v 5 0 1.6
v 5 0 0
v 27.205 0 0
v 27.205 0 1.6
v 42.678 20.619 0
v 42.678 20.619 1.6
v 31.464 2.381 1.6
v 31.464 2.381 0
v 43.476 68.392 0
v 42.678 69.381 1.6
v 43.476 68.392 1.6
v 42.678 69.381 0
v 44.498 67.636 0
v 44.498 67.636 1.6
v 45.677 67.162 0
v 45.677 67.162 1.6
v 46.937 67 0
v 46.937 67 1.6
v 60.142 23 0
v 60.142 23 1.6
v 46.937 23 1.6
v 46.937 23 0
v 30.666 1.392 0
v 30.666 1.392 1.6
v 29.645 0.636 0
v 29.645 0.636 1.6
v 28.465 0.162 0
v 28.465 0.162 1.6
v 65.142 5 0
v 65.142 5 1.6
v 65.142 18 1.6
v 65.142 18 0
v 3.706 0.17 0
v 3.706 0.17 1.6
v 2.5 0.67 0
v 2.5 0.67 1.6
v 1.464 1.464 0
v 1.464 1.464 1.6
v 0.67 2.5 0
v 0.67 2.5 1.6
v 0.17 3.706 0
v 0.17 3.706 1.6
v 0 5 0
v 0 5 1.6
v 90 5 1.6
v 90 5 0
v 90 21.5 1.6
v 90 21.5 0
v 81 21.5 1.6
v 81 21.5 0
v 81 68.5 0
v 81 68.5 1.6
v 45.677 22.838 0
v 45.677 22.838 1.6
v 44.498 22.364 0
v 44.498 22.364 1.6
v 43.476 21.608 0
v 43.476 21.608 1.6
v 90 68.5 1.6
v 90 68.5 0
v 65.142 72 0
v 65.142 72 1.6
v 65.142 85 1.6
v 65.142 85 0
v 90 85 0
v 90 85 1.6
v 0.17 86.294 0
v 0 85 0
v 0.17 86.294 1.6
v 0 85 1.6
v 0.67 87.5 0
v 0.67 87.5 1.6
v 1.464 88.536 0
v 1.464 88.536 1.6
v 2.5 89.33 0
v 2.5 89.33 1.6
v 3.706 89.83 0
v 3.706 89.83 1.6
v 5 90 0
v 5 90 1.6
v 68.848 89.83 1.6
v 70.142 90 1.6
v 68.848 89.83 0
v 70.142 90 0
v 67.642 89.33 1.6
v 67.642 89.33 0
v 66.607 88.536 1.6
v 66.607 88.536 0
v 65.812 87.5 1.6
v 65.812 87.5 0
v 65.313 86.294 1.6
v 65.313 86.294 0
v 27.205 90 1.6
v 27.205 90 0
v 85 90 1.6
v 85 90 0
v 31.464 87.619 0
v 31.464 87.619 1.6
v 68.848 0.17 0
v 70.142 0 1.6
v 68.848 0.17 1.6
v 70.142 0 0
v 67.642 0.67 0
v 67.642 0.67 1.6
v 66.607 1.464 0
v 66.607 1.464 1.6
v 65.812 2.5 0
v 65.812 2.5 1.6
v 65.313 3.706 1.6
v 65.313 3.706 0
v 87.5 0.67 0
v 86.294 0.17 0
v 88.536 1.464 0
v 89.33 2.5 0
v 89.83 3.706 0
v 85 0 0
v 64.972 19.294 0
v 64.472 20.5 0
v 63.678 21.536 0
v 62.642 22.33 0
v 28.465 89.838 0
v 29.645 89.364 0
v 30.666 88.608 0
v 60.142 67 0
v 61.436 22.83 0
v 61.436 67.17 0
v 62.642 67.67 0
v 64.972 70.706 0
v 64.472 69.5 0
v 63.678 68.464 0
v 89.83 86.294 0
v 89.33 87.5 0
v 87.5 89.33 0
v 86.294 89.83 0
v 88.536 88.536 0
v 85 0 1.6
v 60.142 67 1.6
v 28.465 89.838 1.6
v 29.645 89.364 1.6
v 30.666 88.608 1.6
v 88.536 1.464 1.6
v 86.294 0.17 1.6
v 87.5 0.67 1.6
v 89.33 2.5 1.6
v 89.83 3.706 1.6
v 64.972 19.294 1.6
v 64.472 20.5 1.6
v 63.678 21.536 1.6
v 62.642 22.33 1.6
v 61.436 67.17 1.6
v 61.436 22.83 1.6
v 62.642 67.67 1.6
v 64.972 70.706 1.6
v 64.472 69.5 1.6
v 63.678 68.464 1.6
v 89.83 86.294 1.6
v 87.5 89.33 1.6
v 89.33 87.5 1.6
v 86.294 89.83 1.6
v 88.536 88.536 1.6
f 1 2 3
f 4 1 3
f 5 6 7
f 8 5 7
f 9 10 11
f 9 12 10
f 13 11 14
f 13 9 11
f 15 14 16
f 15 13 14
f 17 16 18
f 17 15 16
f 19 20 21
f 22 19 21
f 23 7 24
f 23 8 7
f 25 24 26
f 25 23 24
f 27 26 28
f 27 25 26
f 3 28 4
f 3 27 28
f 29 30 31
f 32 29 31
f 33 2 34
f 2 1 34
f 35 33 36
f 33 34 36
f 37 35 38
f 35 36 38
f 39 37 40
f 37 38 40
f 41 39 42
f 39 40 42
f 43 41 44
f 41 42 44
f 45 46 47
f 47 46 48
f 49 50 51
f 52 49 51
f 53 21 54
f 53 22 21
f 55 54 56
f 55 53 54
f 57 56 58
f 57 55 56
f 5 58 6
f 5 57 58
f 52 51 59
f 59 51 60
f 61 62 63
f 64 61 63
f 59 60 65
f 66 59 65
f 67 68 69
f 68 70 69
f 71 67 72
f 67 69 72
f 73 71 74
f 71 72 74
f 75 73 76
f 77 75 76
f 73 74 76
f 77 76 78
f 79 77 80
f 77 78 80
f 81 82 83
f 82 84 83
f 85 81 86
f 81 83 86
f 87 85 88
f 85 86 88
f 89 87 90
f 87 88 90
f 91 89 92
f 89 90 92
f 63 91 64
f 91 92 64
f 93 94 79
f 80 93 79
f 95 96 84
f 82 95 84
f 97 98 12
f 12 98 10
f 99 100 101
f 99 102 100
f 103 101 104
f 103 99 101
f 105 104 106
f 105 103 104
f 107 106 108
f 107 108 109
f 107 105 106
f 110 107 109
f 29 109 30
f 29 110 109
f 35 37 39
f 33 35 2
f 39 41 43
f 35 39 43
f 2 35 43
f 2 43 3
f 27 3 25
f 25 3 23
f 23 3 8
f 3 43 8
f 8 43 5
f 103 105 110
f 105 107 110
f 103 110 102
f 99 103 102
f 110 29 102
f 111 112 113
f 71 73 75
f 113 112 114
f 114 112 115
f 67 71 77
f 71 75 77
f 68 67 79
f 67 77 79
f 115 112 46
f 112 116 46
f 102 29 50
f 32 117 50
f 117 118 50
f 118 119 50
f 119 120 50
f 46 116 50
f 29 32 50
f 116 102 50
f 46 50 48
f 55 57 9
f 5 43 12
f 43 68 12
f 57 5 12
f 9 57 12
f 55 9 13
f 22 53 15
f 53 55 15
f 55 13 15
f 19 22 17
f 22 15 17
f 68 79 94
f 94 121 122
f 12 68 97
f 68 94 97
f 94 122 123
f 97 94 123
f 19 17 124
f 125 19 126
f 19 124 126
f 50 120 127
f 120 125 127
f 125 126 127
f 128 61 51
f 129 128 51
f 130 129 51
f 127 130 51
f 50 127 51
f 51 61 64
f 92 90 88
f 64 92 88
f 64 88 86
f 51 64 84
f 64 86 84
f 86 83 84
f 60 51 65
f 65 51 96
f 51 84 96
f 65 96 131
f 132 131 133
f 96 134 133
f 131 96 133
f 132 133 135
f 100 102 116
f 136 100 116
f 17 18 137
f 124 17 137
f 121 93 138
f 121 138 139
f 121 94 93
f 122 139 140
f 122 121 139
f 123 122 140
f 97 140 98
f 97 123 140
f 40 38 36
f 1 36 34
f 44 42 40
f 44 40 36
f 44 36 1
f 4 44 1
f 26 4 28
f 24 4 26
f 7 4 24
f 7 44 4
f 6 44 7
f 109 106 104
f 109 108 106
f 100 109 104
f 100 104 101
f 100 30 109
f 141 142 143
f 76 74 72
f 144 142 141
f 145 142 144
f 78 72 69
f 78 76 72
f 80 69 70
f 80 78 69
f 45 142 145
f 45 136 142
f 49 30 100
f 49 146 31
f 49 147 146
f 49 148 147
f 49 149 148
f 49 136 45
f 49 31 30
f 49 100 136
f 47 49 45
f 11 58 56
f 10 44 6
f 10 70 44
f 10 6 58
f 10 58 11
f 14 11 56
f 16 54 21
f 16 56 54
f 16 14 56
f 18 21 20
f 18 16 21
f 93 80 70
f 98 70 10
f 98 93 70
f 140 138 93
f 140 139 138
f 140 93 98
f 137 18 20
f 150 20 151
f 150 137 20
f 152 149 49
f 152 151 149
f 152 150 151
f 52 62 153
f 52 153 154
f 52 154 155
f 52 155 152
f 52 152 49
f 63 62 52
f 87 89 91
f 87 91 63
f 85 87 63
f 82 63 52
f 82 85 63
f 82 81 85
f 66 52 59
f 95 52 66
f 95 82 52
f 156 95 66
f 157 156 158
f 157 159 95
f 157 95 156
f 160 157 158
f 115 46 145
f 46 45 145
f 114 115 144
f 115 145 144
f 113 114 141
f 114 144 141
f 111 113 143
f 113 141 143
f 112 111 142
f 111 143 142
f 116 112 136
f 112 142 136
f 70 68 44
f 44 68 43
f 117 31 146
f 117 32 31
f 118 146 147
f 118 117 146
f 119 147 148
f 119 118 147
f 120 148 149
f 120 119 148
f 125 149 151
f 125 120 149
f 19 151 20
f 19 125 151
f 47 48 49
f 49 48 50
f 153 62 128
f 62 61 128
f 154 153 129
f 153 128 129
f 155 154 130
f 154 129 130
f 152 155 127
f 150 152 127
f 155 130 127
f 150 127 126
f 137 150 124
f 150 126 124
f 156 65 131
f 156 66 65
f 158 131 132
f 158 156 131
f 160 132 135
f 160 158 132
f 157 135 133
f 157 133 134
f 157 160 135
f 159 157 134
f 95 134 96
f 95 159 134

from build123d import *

# Parameters (mm, degrees)
BOSS_EXTRUDE1_DEPTH = 1.6
SKETCH2_OUTSIDE_W   = 117.458
SKETCH2_OUTSIDE_H   = 117.458
CUT_EXTRUDE1_DEPTH  = 128.289276846
FILLET2_R           = 5


with BuildPart() as part:
    # Sketch1 → Boss-Extrude1 (new body)
    with BuildSketch(Plane.XY):
        Polygon((90, 68.5), (90, 90), (0, 90), (0, 0), (90, 0), (90, 21.5), (81, 21.5), (81, 68.5), align=None)
    extrude(amount=BOSS_EXTRUDE1_DEPTH)

    # Sketch2 outside → Cut-Extrude1 (cut, through all)
    with BuildSketch(Plane.XY.offset(1.6)):
        with Locations((45, 45)):
            Rectangle(SKETCH2_OUTSIDE_W, SKETCH2_OUTSIDE_H)
        Polygon((0, 90), (30, 90), (44.142135624, 67), (65.142135624, 67), (65.142135624, 90), (90, 90), (90, 68.5), (81, 68.5), (81, 21.5), (90, 21.5), (90, 0), (65.142135624, 0), (65.142135624, 23), (44.142135624, 23), (30, 0), (0, 0), align=None, mode=Mode.SUBTRACT)
    extrude(amount=-CUT_EXTRUDE1_DEPTH, mode=Mode.SUBTRACT)

    # Fillet2
    fillet2_edges = [part.edges().sort_by_distance(p)[0] for p in [
        (0, 90, 0.8),
        (90, 90, 0.8),
        (90, 0, 0.8),
        (0, 0, 0.8),
        (30, 90, 0.8),
        (44.142135624, 67, 0.8),
        (65.142135624, 67, 0.8),
        (65.142135624, 90, 0.8),
        (65.142135624, 0, 0.8),
        (65.142135624, 23, 0.8),
        (44.142135624, 23, 0.8),
        (30, 0, 0.8),
    ]]
    fillet(fillet2_edges, radius=FILLET2_R)


solid = part.part
